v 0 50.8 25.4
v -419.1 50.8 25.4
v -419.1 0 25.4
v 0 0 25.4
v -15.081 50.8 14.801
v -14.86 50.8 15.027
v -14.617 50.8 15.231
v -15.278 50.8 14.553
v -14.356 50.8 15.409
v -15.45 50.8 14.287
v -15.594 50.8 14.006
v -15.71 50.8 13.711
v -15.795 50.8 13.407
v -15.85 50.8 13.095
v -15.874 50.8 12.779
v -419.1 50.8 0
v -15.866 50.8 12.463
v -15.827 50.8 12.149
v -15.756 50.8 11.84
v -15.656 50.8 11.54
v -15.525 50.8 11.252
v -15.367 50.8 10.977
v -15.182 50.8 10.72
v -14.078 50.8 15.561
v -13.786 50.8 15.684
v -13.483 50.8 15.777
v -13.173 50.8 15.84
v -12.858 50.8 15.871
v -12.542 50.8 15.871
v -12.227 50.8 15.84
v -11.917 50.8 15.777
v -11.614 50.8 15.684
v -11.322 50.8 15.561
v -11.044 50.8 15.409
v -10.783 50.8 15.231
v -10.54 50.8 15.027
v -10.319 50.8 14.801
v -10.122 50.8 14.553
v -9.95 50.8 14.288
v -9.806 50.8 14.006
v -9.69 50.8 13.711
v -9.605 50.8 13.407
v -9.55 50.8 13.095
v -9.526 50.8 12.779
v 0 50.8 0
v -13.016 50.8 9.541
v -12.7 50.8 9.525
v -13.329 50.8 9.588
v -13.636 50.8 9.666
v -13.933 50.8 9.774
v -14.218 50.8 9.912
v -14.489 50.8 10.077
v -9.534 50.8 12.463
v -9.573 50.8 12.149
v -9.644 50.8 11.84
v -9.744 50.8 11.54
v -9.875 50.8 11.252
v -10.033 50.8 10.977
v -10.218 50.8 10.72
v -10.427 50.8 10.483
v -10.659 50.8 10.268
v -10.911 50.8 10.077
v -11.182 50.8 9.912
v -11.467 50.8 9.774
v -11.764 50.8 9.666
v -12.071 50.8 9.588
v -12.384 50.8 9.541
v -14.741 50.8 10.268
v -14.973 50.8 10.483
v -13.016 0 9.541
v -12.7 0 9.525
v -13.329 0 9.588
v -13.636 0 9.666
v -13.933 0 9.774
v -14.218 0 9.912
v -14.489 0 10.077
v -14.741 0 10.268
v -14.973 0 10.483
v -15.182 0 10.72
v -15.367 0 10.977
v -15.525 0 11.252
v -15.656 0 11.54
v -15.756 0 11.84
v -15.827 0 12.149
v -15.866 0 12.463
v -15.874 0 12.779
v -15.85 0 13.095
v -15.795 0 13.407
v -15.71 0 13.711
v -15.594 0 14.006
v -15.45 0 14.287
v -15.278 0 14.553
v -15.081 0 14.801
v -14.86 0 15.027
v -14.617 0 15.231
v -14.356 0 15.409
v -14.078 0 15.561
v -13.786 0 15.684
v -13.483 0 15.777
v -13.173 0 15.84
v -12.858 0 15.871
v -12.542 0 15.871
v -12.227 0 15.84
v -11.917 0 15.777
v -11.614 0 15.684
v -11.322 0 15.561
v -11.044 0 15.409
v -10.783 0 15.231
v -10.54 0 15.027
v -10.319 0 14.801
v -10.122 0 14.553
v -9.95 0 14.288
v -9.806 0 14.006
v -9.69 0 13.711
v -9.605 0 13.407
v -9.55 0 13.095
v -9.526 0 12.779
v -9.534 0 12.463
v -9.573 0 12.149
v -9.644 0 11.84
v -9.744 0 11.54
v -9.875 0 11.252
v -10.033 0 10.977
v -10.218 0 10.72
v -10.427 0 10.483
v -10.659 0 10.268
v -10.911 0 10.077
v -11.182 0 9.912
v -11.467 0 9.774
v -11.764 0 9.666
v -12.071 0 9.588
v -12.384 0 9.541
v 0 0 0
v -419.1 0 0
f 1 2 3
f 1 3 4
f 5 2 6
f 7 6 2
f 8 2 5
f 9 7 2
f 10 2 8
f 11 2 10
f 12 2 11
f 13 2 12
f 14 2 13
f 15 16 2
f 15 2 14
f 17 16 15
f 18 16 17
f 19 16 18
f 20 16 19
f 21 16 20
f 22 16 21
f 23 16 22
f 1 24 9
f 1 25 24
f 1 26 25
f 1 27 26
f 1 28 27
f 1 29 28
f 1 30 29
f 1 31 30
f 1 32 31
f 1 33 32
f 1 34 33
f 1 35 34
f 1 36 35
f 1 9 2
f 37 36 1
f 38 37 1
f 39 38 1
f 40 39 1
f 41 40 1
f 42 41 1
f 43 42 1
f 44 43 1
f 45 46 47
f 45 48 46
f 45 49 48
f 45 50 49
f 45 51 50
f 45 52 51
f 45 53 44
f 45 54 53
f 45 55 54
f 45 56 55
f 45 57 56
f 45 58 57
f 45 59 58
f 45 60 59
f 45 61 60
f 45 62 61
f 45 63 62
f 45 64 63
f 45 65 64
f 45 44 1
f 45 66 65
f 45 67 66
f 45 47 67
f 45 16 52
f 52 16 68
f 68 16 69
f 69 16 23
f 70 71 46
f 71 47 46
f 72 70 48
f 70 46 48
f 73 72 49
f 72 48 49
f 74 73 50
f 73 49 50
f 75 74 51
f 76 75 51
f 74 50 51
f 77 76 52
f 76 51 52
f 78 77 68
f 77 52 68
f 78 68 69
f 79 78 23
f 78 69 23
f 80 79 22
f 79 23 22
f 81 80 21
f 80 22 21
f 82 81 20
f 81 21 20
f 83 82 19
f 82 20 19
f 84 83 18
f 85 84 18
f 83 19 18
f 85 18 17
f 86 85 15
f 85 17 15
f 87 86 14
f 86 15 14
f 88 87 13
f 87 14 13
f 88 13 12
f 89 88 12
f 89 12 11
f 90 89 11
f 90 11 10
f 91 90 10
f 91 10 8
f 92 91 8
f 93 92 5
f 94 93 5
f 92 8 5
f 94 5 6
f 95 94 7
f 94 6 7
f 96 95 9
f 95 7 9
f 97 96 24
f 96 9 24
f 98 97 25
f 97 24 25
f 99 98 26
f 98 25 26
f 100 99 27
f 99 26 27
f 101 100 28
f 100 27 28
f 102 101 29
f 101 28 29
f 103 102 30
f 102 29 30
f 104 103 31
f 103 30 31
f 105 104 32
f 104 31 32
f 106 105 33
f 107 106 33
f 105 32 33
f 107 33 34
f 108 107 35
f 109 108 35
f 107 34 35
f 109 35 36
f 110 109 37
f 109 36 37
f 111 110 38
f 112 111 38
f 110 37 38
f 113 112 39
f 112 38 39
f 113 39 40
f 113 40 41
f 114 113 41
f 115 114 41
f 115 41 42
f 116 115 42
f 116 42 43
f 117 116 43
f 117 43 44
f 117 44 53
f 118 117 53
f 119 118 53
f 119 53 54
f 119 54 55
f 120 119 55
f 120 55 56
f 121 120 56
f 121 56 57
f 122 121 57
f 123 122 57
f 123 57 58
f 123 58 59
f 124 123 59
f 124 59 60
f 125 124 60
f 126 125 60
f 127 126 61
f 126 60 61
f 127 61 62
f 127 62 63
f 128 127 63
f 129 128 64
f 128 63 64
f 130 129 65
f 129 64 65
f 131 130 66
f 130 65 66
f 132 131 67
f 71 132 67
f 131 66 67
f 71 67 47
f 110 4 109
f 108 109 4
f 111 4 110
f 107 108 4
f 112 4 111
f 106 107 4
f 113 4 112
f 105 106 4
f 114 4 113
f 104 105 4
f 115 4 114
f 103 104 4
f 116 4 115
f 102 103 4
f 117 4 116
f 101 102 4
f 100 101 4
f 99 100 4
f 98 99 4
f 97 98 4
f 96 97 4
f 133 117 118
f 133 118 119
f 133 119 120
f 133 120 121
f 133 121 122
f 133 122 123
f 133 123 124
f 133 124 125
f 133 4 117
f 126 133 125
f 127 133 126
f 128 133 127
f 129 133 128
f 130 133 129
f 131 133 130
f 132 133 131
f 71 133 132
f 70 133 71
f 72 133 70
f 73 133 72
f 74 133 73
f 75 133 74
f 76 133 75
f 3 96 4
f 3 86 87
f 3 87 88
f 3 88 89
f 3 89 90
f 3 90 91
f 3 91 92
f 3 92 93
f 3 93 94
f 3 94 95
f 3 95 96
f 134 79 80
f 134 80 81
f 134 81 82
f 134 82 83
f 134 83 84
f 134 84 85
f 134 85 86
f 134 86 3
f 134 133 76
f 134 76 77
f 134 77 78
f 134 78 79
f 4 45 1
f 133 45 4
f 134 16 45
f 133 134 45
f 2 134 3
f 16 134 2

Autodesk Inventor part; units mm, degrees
ref_plane "YZ Plane" through (0, 0, 0) normal (1, 0, 0) x (0, 1, 0)
ref_plane "XZ Plane" through (0, 0, 0) normal (0, 1, 0) x (-1, 0, 0)
ref_plane "XY Plane" through (0, 0, 0) normal (0, 0, 1) x (1, 0, 0)
sketch "Sketch1" plane through (0, 0, 0) normal (0, 0, 1) x (1, 0, 0)
  line L0 (0, 0) -> (-419.1, 0)
  line L1 (-419.1, 0) -> (-419.1, 50.8)
  line L2 (-419.1, 50.8) -> (0, 50.8)
  line L3 (0, 50.8) -> (0, 0)
  dimension "d0" = 419.1
  dimension "d1" = 50.8
extrude "Extrusion1" add sketch "Sketch1" along normal blind 25.4
hole "Hole1" at (-12.7, 0, 12.7) direction (0, 1, 0) diameter 6.35 end through all
properties part number "BackLiftProtoPart2"
